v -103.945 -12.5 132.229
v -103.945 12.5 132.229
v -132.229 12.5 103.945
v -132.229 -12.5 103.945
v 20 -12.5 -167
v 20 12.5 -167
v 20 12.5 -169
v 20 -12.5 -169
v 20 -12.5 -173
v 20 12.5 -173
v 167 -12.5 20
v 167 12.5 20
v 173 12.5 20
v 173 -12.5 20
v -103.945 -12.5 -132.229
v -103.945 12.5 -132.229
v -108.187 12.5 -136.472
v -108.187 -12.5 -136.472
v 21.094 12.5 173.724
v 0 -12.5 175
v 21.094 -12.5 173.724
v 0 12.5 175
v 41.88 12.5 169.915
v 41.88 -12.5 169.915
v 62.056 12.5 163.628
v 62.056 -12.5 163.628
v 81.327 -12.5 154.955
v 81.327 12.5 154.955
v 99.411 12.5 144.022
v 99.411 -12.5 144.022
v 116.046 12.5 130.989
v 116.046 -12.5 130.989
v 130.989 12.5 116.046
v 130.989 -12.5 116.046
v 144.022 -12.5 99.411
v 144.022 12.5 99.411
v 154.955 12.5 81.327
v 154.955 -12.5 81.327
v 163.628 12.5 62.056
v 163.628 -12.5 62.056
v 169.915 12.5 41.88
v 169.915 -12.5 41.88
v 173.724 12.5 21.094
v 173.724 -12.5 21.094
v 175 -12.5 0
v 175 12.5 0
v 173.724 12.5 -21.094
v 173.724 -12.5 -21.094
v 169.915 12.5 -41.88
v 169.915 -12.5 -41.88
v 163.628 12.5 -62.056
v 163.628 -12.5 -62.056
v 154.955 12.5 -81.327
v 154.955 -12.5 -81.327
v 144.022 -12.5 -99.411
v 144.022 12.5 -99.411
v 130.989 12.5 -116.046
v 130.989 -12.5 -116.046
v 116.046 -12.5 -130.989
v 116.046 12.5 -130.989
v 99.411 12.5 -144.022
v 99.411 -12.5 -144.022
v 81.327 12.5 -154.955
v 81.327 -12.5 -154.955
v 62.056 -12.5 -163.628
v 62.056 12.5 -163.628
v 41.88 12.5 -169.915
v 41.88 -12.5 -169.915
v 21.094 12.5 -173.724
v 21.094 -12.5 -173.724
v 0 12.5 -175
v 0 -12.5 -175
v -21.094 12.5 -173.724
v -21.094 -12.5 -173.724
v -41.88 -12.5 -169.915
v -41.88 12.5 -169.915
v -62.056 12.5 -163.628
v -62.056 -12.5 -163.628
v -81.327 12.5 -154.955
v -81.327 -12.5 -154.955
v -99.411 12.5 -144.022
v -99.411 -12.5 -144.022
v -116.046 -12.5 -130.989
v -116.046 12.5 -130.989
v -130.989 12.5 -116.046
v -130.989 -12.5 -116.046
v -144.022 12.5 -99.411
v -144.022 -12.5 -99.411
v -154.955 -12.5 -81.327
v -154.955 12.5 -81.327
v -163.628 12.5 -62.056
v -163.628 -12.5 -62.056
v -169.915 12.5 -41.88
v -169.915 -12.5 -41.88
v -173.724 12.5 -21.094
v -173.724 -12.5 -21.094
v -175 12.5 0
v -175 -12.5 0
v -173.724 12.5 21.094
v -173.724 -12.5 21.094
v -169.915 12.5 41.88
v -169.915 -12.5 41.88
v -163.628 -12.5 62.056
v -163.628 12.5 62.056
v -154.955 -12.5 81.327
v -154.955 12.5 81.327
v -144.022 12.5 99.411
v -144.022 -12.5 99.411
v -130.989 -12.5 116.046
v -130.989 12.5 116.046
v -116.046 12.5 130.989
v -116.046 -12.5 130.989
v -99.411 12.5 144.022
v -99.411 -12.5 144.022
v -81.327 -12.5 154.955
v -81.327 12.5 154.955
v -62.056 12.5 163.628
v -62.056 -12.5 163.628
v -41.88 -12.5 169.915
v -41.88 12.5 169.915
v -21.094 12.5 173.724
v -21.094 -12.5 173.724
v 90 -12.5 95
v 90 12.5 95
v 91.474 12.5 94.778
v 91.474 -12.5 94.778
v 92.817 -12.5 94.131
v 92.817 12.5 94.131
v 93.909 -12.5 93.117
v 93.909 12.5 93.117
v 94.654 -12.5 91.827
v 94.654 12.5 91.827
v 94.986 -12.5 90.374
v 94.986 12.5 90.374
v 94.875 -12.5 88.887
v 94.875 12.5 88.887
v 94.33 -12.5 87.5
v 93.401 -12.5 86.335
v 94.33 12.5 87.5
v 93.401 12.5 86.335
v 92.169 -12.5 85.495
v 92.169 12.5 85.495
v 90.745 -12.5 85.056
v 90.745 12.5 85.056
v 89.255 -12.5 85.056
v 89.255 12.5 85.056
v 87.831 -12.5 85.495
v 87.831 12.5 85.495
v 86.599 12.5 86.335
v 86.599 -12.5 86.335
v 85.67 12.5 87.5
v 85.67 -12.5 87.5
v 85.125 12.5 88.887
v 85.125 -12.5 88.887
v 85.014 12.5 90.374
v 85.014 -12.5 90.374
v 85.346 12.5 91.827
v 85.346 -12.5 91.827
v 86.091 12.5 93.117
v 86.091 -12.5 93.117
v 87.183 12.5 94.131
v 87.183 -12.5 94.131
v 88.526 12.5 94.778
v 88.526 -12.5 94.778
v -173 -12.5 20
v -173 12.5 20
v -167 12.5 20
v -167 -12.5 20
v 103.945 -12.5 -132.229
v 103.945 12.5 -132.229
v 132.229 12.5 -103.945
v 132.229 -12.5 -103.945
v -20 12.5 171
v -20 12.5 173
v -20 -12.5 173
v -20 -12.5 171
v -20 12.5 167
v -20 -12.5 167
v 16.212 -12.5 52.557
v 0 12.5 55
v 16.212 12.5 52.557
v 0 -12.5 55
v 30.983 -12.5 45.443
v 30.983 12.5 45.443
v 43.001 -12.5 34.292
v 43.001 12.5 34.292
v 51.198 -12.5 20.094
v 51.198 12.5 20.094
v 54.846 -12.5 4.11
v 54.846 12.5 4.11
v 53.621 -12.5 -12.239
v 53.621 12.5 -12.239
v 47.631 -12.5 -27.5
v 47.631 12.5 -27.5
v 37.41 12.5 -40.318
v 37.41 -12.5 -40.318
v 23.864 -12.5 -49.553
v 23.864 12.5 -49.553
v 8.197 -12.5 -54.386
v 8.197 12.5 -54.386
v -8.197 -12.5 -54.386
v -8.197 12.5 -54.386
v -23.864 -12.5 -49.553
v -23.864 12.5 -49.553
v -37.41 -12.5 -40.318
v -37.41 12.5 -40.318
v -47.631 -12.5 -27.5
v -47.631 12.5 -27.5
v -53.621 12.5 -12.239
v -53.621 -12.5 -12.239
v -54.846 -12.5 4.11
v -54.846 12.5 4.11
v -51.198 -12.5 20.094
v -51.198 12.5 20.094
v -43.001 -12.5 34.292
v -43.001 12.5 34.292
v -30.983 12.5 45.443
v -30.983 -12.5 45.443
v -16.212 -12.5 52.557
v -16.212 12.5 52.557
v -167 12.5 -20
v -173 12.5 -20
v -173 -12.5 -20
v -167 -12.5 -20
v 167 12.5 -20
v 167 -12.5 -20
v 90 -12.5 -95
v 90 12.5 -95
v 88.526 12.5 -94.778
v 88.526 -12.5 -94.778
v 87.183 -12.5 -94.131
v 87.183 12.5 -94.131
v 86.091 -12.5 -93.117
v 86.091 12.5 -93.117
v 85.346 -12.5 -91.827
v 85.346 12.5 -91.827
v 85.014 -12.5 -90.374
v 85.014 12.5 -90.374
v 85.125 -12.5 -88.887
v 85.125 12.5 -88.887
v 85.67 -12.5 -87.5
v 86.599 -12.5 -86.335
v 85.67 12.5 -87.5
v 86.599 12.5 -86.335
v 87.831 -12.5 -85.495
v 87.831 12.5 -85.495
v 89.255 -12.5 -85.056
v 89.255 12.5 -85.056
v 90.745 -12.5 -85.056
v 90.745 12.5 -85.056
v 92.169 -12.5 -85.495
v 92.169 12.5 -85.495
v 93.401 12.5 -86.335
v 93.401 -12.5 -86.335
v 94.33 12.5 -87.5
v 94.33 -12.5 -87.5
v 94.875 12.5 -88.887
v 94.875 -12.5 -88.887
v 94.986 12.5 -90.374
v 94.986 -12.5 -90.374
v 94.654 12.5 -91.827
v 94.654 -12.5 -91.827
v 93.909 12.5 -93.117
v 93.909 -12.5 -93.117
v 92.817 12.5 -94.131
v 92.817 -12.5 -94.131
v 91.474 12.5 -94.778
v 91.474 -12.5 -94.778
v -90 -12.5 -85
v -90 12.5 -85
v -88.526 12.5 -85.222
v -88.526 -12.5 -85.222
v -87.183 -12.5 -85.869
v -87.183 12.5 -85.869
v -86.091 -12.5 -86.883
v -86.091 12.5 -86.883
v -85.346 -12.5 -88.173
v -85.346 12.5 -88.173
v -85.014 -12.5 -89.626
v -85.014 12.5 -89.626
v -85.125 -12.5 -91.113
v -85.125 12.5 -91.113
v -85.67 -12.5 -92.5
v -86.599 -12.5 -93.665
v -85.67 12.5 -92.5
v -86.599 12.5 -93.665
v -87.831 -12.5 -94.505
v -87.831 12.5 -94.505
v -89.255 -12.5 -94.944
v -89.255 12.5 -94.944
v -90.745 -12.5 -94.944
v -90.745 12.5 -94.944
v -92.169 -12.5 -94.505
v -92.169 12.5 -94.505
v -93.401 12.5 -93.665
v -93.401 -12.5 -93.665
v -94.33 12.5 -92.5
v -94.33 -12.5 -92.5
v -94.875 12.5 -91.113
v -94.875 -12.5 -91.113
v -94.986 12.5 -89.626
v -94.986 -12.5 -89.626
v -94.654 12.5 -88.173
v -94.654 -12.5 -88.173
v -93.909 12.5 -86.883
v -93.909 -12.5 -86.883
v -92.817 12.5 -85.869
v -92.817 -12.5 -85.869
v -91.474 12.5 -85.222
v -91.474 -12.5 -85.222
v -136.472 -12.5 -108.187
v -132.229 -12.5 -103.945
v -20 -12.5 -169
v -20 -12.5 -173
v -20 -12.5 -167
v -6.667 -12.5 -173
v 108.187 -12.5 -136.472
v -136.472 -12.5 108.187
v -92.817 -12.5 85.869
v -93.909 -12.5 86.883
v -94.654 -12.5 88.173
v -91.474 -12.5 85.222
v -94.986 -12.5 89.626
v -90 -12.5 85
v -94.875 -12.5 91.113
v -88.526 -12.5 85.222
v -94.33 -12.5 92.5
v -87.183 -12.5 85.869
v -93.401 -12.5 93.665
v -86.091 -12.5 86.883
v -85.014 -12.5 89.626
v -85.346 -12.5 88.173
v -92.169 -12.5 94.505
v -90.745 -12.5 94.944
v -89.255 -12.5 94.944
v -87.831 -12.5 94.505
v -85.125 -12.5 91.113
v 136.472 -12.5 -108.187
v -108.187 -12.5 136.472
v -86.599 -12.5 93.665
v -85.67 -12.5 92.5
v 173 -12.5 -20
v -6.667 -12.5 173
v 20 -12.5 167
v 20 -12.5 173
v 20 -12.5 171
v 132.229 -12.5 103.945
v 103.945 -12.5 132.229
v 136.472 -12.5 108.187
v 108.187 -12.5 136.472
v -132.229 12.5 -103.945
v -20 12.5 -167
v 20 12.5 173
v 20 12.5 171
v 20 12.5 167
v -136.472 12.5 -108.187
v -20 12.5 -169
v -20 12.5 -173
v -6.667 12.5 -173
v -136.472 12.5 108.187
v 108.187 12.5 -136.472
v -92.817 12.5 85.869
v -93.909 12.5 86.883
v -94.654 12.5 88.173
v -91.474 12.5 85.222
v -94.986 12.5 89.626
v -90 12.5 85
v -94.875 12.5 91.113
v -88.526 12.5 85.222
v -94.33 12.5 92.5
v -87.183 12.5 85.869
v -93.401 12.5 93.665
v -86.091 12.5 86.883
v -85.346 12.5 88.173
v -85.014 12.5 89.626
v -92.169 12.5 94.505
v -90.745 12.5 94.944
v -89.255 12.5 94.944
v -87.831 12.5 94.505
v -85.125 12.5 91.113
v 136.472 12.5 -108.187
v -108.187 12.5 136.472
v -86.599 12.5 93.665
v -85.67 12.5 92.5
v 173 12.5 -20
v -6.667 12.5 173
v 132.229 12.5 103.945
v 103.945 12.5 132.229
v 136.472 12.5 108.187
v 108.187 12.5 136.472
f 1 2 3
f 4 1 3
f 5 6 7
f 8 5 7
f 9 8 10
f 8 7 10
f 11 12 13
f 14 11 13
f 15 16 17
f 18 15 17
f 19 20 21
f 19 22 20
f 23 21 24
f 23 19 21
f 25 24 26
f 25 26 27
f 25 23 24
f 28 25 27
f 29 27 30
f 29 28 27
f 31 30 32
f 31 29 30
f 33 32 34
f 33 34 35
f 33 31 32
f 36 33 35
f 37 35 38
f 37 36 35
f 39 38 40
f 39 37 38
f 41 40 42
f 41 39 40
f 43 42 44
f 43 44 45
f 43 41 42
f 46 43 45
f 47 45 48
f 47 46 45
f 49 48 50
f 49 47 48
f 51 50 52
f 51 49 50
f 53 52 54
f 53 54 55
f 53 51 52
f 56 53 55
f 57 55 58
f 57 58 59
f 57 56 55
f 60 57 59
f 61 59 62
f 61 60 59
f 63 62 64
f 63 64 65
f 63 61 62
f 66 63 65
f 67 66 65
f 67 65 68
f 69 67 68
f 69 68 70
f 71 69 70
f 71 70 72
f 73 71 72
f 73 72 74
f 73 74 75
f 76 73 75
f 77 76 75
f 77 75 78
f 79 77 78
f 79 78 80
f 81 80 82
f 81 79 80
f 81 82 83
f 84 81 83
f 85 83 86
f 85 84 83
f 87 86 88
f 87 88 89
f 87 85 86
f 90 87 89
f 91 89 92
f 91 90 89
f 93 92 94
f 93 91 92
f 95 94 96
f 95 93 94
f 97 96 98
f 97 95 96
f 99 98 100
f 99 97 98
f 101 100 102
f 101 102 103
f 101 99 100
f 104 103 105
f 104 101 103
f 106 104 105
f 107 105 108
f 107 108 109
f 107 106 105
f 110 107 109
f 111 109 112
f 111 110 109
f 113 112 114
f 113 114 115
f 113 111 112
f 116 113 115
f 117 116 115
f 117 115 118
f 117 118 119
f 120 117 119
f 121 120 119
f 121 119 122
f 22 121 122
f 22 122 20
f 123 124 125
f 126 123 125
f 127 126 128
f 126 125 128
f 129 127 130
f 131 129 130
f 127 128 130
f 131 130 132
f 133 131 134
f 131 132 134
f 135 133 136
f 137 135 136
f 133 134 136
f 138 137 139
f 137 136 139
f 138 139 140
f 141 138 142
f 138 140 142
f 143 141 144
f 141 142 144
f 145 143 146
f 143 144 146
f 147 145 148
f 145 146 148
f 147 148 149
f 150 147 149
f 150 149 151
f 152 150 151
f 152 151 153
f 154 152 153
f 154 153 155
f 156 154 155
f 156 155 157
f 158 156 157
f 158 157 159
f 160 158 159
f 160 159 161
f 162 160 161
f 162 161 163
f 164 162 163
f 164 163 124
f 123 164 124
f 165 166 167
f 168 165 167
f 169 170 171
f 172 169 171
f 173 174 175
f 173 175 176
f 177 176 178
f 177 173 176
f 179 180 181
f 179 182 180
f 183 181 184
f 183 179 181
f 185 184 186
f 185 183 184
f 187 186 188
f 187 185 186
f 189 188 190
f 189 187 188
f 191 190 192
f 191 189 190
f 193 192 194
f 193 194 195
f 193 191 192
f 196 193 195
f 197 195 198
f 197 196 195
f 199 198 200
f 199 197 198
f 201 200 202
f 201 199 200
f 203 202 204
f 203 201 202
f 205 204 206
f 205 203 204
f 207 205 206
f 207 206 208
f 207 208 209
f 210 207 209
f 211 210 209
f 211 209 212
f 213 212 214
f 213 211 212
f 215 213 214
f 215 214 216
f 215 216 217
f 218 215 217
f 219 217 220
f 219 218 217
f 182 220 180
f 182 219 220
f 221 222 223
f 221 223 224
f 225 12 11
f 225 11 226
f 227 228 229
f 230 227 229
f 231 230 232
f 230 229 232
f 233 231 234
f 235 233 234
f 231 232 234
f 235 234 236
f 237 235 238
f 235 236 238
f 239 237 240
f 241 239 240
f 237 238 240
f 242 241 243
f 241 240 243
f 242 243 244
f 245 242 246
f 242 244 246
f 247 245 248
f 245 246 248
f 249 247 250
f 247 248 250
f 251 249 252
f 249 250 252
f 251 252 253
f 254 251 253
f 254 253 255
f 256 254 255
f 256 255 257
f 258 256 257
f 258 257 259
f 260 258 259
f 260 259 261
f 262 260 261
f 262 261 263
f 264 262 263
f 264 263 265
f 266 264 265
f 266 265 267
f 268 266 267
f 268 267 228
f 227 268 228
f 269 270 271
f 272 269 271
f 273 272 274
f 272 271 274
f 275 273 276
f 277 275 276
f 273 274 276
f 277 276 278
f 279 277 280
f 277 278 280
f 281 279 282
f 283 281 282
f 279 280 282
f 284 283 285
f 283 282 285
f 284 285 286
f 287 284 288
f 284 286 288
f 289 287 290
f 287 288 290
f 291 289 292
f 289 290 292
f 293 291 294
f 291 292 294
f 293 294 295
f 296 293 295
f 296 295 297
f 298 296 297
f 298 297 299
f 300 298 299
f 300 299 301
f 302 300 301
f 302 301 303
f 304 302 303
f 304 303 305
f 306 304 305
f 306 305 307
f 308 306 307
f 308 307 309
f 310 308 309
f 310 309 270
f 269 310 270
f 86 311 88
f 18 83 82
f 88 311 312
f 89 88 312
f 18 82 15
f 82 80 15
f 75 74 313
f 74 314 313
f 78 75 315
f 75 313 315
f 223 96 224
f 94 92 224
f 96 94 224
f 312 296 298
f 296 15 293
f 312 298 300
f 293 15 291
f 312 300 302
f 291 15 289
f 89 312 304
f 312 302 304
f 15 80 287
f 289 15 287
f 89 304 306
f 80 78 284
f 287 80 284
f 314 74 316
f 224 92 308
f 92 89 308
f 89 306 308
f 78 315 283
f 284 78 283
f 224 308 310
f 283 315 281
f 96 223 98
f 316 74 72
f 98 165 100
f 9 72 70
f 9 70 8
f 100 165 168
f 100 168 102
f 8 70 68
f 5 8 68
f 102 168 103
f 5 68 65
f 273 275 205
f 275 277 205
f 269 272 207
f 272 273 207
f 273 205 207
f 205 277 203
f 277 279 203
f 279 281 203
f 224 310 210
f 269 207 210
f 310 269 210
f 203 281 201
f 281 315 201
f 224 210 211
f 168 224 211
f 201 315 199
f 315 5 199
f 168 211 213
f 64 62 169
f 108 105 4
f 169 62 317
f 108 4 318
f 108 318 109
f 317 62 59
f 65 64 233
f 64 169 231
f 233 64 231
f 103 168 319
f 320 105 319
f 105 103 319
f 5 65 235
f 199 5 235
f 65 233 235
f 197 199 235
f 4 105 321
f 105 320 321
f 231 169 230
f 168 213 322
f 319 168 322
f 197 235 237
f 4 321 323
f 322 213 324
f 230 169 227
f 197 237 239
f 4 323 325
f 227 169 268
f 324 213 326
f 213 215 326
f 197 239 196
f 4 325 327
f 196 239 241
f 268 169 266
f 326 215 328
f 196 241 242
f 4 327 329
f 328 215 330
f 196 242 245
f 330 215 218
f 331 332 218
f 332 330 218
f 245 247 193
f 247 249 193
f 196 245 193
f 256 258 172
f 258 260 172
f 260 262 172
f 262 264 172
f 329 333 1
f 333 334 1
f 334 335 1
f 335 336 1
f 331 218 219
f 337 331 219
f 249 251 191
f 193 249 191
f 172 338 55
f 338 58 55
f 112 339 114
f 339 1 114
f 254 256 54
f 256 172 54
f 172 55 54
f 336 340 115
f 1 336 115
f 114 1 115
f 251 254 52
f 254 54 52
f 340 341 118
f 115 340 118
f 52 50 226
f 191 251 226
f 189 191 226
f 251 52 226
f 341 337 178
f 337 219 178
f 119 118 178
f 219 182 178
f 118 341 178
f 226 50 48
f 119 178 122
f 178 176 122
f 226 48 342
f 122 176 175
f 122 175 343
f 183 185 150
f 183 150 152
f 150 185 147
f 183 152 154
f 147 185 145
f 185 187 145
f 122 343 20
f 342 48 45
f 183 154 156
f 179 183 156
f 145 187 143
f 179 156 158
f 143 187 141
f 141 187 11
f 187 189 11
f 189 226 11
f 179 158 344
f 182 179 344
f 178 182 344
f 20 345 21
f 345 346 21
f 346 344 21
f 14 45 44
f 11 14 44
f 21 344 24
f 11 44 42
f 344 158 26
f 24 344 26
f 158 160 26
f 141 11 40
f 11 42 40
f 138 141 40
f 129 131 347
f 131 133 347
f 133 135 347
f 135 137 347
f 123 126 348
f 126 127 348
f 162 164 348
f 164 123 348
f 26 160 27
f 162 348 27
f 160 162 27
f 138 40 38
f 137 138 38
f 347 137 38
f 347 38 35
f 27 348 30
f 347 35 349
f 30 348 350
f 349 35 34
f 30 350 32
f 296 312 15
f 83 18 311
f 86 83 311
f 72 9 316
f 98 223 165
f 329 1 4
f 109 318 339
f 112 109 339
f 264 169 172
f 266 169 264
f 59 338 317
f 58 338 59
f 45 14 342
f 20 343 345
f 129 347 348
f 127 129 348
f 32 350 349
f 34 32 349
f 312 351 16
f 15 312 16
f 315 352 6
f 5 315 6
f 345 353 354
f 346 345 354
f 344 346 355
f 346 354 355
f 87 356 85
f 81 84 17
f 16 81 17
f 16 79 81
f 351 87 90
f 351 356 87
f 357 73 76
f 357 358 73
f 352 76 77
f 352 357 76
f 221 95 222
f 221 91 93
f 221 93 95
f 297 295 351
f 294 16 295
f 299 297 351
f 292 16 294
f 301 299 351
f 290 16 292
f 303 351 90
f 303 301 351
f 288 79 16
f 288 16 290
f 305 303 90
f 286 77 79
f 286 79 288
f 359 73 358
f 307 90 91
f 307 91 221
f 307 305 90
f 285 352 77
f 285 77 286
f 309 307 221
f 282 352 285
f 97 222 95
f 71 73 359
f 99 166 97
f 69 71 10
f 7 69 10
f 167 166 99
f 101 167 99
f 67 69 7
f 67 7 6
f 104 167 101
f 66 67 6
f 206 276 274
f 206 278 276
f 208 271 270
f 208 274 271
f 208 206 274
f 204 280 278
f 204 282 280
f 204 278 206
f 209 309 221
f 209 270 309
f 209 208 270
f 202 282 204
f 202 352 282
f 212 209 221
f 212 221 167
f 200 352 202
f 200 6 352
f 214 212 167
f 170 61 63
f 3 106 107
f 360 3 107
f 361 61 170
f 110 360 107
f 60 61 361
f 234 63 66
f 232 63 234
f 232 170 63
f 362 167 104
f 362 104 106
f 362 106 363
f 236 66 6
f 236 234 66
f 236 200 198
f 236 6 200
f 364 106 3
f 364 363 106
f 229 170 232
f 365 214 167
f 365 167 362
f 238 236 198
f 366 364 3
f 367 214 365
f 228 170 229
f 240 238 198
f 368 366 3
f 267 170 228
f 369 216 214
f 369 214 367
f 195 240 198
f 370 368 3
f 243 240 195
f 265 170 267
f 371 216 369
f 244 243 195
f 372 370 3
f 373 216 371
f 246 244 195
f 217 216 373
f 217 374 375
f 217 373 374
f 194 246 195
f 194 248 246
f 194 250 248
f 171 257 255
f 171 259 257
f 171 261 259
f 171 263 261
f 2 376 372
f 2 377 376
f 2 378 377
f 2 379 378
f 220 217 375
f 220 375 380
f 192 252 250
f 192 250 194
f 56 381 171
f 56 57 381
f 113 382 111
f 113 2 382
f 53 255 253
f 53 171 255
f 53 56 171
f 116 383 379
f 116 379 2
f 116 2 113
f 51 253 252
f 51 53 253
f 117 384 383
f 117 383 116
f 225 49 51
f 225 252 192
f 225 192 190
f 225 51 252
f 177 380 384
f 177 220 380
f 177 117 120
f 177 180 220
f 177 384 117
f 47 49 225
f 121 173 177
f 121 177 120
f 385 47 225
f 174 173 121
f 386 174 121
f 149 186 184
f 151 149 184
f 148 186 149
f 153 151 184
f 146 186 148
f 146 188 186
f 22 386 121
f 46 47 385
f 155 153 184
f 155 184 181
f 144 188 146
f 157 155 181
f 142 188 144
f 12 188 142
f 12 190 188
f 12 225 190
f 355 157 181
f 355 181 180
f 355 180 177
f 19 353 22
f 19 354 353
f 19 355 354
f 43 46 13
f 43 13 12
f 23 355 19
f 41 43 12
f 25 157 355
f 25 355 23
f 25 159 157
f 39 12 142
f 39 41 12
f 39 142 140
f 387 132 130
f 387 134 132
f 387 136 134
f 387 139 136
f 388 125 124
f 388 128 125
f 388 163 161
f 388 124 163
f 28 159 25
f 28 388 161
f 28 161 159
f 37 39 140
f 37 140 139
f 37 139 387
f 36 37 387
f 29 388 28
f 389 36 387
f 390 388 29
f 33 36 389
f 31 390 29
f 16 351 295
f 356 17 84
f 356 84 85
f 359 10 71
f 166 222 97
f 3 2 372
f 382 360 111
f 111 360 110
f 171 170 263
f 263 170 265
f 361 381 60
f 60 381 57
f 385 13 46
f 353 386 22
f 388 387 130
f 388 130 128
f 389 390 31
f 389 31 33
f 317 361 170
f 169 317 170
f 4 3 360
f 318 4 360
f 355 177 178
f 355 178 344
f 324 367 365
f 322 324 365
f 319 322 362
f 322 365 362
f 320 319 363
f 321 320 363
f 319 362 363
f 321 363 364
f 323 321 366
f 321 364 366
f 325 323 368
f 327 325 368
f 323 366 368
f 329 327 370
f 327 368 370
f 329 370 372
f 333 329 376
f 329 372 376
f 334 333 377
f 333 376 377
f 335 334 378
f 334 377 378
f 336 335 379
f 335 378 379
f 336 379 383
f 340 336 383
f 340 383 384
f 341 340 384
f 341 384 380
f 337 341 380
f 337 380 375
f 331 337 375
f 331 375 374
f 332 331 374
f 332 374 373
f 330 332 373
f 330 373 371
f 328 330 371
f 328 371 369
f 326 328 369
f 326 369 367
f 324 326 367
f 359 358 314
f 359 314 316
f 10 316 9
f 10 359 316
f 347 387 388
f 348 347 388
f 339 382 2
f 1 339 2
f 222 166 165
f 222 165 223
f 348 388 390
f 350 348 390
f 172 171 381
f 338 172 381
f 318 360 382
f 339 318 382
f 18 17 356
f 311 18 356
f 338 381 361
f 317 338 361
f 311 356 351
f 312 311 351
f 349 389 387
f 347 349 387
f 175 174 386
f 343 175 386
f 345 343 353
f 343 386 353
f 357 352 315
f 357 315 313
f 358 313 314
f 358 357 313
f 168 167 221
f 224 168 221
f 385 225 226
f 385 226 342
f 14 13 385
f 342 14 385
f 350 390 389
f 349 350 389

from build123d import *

# Parameters (mm, degrees)
SKETCH1_R           = 175
SKETCH1_R_2         = 55
BOSS_EXTRUDE1_DEPTH = 12.5
SKETCH2_W           = 40
SKETCH2_H           = 6
SKETCH2_W_2         = 6
SKETCH2_H_2         = 40
CUT_EXTRUDE2_DEPTH  = 249.746859277
SKETCH3_R           = 5
CUT_EXTRUDE3_DEPTH  = 249.746859277


with BuildPart() as part:
    # Sketch1 → Boss-Extrude1 (new, symmetric)
    with BuildSketch(Plane(origin=(0, 0, 0), x_dir=(1, 0, 0), z_dir=(0, 1, 0))):
        with Locations(Location((0, 0, 0), (0, 0, 270))):
            Circle(SKETCH1_R)
        with Locations(Location((0, 0, 0), (0, 0, 270))):
            Circle(SKETCH1_R_2, mode=Mode.SUBTRACT)
    extrude(amount=BOSS_EXTRUDE1_DEPTH, both=True)

    # Sketch2 → Cut-Extrude2 (cut, through all)
    with BuildSketch(Plane(origin=(0, 12.5, 0), x_dir=(1, 0, 0), z_dir=(0, 1, 0))):
        with Locations((0, 170)):
            Rectangle(SKETCH2_W, SKETCH2_H)
        Polygon((103.944696834, 132.228968082), (132.228968082, 103.944696834), (136.471608769, 108.187337522), (108.187337522, 136.471608769), align=None)
        with Locations((170, 0)):
            Rectangle(SKETCH2_W_2, SKETCH2_H_2)
        Polygon((132.228968082, -103.944696834), (103.944696834, -132.228968082), (108.187337522, -136.471608769), (136.471608769, -108.187337522), align=None)
        with Locations((0, -170)):
            Rectangle(SKETCH2_W, SKETCH2_H)
        Polygon((-103.944696834, -132.228968082), (-132.228968082, -103.944696834), (-136.471608769, -108.187337522), (-108.187337522, -136.471608769), align=None)
        with Locations((-170, 0)):
            Rectangle(SKETCH2_W_2, SKETCH2_H_2)
        Polygon((-132.228968082, 103.944696834), (-103.944696834, 132.228968082), (-108.187337522, 136.471608769), (-136.471608769, 108.187337522), align=None)
    extrude(amount=-CUT_EXTRUDE2_DEPTH, mode=Mode.SUBTRACT)

    # Sketch3 → Cut-Extrude3 (cut, through all)
    with BuildSketch(Plane(origin=(0, 12.5, 0), x_dir=(1, 0, 0), z_dir=(0, 1, 0))):
        with Locations(Location((-90, 90, 0), (0, 0, 270))):
            Circle(SKETCH3_R)
        with Locations(Location((90, 90, 0), (0, 0, 90))):
            Circle(SKETCH3_R)
        with Locations(Location((90, -90, 0), (0, 0, 270))):
            Circle(SKETCH3_R)
        with Locations(Location((-90, -90, 0), (0, 0, 90))):
            Circle(SKETCH3_R)
    extrude(amount=-CUT_EXTRUDE3_DEPTH, mode=Mode.SUBTRACT)


solid = part.part
